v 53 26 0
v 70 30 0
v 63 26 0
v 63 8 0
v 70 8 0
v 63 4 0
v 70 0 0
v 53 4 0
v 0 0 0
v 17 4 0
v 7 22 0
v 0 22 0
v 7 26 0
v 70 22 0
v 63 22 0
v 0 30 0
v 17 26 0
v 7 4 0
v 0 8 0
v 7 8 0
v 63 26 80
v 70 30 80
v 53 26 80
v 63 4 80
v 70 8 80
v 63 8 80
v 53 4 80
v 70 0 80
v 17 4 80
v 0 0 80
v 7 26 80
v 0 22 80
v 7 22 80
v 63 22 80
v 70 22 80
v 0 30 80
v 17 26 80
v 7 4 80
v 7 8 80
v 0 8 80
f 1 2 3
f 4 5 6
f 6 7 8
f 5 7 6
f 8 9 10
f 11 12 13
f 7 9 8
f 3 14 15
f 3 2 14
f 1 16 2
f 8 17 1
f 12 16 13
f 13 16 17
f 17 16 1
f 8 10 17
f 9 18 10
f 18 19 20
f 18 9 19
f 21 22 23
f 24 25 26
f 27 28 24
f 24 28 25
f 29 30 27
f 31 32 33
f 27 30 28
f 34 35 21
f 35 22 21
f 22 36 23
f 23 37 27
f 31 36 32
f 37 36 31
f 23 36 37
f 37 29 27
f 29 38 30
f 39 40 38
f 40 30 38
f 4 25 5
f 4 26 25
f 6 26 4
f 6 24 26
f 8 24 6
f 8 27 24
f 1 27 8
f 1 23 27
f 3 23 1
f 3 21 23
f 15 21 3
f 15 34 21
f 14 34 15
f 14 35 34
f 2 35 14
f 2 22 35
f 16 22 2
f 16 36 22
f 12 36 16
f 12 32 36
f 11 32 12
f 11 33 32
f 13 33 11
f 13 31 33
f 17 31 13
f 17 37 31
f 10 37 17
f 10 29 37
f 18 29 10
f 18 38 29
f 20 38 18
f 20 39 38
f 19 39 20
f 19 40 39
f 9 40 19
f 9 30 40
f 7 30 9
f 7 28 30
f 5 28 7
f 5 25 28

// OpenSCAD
$fn = 32;

// ----------------------------------------------------------------------
// T-slot rail: 70 x 30 mm section, 80 mm long
// ----------------------------------------------------------------------

// --- parameters (mm) ---
profile_height = 80;      // extrusion height
profile_points = 20;      // points of the closed outline

profile = [[0, 0], [70, 0], [70, 8], [63, 8], [63, 4], [53, 4], [53, 26], [63, 26], [63, 22], [70, 22], [70, 30], [0, 30], [0, 22], [7, 22], [7, 26], [17, 26], [17, 4], [7, 4], [7, 8], [0, 8]];  // single closed polygon, 20 points, counter clockwise

// --- the one profile operation ---
linear_extrude(height = profile_height) polygon(points = profile);
